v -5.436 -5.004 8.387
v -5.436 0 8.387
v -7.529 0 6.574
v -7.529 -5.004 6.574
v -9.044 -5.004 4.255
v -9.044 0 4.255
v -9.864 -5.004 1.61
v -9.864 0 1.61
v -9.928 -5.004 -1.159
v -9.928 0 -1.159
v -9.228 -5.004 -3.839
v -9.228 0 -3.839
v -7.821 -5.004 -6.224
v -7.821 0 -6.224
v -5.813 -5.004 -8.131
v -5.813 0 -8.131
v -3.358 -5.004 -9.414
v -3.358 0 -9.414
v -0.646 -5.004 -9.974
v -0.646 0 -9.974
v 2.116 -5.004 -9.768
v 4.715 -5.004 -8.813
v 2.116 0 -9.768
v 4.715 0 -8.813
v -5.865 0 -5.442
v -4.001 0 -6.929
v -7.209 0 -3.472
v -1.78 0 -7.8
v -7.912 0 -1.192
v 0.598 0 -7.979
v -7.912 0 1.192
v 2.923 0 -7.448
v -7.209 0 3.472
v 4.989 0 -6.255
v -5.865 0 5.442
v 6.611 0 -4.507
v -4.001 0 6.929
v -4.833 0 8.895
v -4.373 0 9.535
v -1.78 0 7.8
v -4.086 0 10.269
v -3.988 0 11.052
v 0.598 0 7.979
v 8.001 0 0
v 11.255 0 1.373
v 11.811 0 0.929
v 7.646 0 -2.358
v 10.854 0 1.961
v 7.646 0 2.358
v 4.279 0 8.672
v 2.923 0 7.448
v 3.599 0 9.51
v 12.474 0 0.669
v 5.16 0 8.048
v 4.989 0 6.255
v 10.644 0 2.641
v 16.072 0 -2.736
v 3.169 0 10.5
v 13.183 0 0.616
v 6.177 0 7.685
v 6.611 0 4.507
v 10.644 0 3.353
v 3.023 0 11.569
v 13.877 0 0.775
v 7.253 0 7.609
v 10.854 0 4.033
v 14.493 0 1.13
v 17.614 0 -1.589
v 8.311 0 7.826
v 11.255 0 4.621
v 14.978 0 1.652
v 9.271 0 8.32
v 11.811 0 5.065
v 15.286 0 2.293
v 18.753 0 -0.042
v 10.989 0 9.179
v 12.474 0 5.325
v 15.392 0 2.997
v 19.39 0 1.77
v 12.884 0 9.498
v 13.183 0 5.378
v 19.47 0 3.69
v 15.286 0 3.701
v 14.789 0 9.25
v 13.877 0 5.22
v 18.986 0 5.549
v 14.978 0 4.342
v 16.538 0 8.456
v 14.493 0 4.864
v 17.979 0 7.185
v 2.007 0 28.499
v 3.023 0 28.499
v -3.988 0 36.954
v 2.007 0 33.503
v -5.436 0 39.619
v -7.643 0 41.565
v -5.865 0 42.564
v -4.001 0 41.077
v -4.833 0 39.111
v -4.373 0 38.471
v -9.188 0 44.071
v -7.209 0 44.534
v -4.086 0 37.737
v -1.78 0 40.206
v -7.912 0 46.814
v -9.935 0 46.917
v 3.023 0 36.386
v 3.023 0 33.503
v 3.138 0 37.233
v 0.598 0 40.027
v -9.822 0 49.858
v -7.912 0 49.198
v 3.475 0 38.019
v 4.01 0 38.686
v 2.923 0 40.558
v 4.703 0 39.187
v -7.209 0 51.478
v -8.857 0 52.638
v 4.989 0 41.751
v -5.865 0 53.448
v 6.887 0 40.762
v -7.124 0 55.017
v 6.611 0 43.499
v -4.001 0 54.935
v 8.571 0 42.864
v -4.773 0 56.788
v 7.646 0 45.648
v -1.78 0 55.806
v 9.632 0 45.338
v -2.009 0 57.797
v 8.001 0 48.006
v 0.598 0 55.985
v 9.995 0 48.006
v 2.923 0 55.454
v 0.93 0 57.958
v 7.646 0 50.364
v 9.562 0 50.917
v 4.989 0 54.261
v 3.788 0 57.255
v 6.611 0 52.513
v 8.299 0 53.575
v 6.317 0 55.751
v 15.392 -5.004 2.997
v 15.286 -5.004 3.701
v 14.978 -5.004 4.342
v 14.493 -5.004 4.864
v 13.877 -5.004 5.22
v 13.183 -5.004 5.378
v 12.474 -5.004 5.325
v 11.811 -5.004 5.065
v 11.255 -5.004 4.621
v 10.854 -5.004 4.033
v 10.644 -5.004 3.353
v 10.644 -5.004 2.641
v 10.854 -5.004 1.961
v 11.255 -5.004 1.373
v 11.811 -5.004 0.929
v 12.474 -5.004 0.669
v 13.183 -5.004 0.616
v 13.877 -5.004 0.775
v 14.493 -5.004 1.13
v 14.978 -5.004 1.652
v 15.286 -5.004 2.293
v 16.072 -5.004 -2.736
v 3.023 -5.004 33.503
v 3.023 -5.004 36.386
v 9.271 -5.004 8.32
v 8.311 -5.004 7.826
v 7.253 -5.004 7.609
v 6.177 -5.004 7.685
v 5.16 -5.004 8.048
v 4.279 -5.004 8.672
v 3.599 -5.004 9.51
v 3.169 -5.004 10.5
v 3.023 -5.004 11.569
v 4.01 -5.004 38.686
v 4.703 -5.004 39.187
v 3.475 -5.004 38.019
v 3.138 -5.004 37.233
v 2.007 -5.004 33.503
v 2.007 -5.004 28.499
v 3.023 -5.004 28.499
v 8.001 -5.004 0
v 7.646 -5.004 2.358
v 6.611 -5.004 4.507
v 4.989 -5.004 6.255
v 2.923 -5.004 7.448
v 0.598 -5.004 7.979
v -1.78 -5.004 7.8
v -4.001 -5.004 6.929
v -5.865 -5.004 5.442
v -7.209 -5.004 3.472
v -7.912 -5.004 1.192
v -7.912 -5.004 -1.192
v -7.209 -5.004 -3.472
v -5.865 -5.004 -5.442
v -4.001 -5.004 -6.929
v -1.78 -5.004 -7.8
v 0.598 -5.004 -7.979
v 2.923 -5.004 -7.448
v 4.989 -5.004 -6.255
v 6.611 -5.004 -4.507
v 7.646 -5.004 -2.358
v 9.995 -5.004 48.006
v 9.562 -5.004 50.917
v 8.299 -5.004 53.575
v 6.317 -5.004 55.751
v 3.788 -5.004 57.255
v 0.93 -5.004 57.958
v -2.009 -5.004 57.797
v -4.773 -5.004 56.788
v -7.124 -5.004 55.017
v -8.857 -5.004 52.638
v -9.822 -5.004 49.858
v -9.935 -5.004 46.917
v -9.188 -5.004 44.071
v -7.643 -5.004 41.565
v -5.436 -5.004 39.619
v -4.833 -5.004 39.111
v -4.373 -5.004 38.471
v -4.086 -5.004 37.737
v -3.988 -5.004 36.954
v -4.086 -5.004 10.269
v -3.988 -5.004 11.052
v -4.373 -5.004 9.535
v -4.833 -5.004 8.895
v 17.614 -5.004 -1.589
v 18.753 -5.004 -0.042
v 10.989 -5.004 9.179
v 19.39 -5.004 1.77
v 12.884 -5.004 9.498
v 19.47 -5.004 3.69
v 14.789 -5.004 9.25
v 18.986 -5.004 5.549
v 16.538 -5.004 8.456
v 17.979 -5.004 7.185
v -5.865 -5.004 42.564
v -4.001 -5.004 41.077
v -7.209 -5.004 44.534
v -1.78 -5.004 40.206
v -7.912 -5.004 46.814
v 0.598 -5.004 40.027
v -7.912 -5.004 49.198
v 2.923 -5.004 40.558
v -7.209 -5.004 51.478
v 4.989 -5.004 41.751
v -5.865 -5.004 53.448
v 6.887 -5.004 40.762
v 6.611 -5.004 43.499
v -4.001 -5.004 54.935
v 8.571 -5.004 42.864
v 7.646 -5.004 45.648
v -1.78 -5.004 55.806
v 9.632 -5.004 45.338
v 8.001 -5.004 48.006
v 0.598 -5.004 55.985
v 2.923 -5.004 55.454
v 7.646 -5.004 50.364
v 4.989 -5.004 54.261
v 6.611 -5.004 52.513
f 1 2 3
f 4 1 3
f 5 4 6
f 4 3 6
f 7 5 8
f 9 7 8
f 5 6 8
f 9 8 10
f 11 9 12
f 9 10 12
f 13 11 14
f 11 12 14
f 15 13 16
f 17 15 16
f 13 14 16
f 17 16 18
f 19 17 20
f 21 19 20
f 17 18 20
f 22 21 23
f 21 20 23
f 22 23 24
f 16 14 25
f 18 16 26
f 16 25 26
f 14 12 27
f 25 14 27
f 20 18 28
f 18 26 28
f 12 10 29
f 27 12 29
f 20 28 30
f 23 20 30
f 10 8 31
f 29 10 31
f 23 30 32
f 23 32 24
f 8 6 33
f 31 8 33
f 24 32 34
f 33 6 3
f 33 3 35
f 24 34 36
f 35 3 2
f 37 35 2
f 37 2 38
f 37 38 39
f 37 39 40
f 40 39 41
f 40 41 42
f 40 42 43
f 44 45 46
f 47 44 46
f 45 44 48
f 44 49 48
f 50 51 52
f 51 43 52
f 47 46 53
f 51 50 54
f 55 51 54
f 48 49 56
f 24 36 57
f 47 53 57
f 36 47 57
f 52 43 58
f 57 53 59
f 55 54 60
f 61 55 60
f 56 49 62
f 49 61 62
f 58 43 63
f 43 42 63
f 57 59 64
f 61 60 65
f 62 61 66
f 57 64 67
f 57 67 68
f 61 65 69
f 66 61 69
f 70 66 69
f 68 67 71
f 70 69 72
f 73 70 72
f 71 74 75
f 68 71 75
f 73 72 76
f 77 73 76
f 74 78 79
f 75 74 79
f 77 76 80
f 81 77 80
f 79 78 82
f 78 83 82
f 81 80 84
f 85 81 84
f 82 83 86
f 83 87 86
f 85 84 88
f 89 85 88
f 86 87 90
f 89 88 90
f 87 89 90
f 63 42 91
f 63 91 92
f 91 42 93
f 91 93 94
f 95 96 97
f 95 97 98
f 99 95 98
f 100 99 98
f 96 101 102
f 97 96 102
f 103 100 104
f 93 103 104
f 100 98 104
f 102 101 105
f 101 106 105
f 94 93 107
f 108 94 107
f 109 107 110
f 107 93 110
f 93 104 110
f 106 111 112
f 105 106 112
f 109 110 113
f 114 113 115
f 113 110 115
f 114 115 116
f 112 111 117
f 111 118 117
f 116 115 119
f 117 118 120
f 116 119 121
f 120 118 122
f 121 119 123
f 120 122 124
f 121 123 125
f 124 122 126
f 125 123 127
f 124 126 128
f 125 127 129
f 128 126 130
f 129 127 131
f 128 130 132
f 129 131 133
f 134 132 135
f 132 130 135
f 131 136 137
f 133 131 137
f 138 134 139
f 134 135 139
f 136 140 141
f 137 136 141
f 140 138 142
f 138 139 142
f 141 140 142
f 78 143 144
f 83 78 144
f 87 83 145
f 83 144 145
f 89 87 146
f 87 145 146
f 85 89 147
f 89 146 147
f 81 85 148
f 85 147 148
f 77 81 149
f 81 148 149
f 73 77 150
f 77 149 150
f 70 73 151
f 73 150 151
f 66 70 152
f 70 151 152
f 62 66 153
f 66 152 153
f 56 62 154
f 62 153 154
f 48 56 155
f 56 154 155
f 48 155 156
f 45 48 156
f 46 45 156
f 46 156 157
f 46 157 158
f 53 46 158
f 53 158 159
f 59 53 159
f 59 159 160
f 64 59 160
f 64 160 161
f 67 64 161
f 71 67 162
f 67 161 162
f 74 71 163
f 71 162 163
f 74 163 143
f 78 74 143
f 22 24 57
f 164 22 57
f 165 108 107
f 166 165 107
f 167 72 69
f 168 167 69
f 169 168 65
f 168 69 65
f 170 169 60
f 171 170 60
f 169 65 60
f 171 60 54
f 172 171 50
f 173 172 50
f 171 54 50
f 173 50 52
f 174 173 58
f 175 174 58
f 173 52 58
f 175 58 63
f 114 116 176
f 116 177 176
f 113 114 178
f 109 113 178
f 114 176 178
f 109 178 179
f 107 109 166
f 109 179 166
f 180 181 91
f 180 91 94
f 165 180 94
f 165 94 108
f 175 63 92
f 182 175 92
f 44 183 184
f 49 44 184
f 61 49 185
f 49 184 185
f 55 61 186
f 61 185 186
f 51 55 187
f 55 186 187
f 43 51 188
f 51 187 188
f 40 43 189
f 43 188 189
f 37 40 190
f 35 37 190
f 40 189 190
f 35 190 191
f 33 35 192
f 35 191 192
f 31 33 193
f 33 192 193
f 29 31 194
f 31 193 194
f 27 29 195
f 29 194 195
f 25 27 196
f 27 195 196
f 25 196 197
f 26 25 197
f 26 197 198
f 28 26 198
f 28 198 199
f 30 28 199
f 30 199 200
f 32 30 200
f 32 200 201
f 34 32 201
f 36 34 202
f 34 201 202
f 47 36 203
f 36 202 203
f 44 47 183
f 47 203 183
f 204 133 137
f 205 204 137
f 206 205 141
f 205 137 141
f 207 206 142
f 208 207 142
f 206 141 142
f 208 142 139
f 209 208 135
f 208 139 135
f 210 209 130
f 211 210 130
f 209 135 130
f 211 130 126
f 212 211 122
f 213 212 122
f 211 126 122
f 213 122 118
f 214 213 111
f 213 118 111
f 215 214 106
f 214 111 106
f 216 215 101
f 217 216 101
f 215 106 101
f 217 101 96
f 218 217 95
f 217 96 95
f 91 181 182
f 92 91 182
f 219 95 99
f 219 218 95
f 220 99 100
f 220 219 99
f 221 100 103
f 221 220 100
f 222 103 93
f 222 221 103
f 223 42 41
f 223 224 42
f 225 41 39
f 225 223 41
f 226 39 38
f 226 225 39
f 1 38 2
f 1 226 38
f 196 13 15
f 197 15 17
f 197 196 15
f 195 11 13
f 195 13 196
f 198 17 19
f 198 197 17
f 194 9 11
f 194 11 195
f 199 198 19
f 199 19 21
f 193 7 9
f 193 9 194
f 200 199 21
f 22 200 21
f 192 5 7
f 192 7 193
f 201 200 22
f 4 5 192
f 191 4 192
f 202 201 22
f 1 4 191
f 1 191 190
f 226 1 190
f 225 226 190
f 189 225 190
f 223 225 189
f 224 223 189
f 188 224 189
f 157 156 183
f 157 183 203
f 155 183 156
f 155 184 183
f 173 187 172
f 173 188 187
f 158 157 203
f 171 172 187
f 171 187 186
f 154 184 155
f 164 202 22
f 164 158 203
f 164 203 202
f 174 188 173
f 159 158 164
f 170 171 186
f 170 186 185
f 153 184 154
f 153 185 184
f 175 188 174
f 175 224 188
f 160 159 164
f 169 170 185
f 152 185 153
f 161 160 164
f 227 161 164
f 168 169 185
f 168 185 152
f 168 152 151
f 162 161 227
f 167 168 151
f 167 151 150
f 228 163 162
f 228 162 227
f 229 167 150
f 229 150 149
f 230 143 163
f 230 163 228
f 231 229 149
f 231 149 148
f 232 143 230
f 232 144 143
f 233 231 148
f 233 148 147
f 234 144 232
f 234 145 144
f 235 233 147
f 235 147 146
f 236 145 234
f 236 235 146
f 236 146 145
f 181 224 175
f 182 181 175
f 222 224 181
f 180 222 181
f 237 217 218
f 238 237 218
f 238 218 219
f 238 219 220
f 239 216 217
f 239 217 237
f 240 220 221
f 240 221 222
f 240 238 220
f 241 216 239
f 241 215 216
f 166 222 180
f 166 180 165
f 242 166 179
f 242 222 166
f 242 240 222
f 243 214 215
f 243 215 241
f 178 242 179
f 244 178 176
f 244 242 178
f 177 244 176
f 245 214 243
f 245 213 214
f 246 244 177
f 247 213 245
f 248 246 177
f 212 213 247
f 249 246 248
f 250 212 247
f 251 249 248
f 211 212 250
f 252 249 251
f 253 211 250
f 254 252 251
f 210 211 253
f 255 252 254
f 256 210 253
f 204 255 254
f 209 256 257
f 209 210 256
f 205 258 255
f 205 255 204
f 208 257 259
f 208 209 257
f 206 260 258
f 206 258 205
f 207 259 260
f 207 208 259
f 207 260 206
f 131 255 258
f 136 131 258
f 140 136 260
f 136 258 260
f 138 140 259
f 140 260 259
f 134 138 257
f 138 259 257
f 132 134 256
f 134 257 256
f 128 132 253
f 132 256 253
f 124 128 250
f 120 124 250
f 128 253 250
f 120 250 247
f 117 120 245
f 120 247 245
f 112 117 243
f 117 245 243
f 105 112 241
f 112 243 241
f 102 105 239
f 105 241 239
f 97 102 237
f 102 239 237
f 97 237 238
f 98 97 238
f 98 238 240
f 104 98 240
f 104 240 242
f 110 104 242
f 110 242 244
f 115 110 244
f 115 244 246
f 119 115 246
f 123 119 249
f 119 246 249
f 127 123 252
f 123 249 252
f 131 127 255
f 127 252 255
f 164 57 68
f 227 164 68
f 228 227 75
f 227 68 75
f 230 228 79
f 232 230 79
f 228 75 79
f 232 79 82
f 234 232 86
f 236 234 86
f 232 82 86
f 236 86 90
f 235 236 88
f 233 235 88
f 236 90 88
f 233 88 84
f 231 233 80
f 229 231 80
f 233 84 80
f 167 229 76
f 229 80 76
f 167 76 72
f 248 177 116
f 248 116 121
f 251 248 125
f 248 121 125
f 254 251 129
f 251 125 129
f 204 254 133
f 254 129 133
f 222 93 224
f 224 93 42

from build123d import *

# Parameters (mm, degrees)
F1_DEPTH = 5.0038
F2_R     = 3.175
F3_R     = 8.001
F4_DEPTH = 5.0038
F5_W     = 1.016
F5_H     = 5.0038
F6_DEPTH = 5.0038
F7_R     = 2.3876
F8_DEPTH = 5.0038


with BuildPart() as f1:
    # F0 (on Front) → F1 (new body)
    with BuildSketch(Plane.XZ):
        with BuildLine():
            ThreePointArc((9.9949, 48.006), (-5.4790676118, 56.3652968673), (-3.9878, 38.841095354))
            ThreePointArc((-3.9878, 38.841095354), (-0.5154258333, 38.0243988148), (3.0226, 38.4790951905))
            ThreePointArc((3.0226, 38.4790951905), (8.0656249215, 42.1031430108), (9.9949, 48.006))
        make_face()
        with BuildLine():
            Line((-3.9878, 38.841095354), (-3.9878, 9.164904646))
            ThreePointArc((-3.9878, 9.164904646), (-8.9961822265, -4.3550810966), (4.7152403545, -8.8127484027))
            Line((4.7152403545, -8.8127484027), (16.0724023653, -2.7361255174))
            ThreePointArc((16.0724023653, -2.7361255174), (18.5431093303, 6.4043007502), (9.270553305, 8.3204140086))
            ThreePointArc((9.270553305, 8.3204140086), (5.1603136206, 8.0483265237), (3.0226, 11.5694459962))
            Line((3.0226, 11.5694459962), (3.0226, 38.4790951905))
            ThreePointArc((3.0226, 38.4790951905), (-0.5154258333, 38.0243988148), (-3.9878, 38.841095354))
        make_face()
    extrude(amount=F1_DEPTH)

    # F2
    f2_edges = [f1.edges().sort_by_distance(p)[0] for p in [
        (-3.9878, -2.5019, 38.841095),
        (3.0226, -2.5019, 38.479095),
        (-3.9878, -2.5019, 9.164905),
    ]]
    fillet(f2_edges, radius=F2_R)

    # F3 (on face) → F4 (cut)
    with BuildSketch(Plane.XZ.offset(5.0038)):
        with Locations((0, 48.006)):
            Circle(F3_R)
        Circle(F3_R)
    extrude(amount=-F4_DEPTH, mode=Mode.SUBTRACT)

    # F5 (on face) → F6 (cut)
    with BuildSketch(Plane.XZ.offset(5.0038)):
        with Locations((2.5146, 31.0007)):
            Rectangle(F5_W, F5_H)
    extrude(amount=-F6_DEPTH, mode=Mode.SUBTRACT)

    # F7 (on face) → F8 (cut)
    with BuildSketch(Plane.XZ.offset(5.0038)):
        with Locations((13.0048, 2.9972)):
            Circle(F7_R)
    extrude(amount=-F8_DEPTH, mode=Mode.SUBTRACT)


solid = f1.part
